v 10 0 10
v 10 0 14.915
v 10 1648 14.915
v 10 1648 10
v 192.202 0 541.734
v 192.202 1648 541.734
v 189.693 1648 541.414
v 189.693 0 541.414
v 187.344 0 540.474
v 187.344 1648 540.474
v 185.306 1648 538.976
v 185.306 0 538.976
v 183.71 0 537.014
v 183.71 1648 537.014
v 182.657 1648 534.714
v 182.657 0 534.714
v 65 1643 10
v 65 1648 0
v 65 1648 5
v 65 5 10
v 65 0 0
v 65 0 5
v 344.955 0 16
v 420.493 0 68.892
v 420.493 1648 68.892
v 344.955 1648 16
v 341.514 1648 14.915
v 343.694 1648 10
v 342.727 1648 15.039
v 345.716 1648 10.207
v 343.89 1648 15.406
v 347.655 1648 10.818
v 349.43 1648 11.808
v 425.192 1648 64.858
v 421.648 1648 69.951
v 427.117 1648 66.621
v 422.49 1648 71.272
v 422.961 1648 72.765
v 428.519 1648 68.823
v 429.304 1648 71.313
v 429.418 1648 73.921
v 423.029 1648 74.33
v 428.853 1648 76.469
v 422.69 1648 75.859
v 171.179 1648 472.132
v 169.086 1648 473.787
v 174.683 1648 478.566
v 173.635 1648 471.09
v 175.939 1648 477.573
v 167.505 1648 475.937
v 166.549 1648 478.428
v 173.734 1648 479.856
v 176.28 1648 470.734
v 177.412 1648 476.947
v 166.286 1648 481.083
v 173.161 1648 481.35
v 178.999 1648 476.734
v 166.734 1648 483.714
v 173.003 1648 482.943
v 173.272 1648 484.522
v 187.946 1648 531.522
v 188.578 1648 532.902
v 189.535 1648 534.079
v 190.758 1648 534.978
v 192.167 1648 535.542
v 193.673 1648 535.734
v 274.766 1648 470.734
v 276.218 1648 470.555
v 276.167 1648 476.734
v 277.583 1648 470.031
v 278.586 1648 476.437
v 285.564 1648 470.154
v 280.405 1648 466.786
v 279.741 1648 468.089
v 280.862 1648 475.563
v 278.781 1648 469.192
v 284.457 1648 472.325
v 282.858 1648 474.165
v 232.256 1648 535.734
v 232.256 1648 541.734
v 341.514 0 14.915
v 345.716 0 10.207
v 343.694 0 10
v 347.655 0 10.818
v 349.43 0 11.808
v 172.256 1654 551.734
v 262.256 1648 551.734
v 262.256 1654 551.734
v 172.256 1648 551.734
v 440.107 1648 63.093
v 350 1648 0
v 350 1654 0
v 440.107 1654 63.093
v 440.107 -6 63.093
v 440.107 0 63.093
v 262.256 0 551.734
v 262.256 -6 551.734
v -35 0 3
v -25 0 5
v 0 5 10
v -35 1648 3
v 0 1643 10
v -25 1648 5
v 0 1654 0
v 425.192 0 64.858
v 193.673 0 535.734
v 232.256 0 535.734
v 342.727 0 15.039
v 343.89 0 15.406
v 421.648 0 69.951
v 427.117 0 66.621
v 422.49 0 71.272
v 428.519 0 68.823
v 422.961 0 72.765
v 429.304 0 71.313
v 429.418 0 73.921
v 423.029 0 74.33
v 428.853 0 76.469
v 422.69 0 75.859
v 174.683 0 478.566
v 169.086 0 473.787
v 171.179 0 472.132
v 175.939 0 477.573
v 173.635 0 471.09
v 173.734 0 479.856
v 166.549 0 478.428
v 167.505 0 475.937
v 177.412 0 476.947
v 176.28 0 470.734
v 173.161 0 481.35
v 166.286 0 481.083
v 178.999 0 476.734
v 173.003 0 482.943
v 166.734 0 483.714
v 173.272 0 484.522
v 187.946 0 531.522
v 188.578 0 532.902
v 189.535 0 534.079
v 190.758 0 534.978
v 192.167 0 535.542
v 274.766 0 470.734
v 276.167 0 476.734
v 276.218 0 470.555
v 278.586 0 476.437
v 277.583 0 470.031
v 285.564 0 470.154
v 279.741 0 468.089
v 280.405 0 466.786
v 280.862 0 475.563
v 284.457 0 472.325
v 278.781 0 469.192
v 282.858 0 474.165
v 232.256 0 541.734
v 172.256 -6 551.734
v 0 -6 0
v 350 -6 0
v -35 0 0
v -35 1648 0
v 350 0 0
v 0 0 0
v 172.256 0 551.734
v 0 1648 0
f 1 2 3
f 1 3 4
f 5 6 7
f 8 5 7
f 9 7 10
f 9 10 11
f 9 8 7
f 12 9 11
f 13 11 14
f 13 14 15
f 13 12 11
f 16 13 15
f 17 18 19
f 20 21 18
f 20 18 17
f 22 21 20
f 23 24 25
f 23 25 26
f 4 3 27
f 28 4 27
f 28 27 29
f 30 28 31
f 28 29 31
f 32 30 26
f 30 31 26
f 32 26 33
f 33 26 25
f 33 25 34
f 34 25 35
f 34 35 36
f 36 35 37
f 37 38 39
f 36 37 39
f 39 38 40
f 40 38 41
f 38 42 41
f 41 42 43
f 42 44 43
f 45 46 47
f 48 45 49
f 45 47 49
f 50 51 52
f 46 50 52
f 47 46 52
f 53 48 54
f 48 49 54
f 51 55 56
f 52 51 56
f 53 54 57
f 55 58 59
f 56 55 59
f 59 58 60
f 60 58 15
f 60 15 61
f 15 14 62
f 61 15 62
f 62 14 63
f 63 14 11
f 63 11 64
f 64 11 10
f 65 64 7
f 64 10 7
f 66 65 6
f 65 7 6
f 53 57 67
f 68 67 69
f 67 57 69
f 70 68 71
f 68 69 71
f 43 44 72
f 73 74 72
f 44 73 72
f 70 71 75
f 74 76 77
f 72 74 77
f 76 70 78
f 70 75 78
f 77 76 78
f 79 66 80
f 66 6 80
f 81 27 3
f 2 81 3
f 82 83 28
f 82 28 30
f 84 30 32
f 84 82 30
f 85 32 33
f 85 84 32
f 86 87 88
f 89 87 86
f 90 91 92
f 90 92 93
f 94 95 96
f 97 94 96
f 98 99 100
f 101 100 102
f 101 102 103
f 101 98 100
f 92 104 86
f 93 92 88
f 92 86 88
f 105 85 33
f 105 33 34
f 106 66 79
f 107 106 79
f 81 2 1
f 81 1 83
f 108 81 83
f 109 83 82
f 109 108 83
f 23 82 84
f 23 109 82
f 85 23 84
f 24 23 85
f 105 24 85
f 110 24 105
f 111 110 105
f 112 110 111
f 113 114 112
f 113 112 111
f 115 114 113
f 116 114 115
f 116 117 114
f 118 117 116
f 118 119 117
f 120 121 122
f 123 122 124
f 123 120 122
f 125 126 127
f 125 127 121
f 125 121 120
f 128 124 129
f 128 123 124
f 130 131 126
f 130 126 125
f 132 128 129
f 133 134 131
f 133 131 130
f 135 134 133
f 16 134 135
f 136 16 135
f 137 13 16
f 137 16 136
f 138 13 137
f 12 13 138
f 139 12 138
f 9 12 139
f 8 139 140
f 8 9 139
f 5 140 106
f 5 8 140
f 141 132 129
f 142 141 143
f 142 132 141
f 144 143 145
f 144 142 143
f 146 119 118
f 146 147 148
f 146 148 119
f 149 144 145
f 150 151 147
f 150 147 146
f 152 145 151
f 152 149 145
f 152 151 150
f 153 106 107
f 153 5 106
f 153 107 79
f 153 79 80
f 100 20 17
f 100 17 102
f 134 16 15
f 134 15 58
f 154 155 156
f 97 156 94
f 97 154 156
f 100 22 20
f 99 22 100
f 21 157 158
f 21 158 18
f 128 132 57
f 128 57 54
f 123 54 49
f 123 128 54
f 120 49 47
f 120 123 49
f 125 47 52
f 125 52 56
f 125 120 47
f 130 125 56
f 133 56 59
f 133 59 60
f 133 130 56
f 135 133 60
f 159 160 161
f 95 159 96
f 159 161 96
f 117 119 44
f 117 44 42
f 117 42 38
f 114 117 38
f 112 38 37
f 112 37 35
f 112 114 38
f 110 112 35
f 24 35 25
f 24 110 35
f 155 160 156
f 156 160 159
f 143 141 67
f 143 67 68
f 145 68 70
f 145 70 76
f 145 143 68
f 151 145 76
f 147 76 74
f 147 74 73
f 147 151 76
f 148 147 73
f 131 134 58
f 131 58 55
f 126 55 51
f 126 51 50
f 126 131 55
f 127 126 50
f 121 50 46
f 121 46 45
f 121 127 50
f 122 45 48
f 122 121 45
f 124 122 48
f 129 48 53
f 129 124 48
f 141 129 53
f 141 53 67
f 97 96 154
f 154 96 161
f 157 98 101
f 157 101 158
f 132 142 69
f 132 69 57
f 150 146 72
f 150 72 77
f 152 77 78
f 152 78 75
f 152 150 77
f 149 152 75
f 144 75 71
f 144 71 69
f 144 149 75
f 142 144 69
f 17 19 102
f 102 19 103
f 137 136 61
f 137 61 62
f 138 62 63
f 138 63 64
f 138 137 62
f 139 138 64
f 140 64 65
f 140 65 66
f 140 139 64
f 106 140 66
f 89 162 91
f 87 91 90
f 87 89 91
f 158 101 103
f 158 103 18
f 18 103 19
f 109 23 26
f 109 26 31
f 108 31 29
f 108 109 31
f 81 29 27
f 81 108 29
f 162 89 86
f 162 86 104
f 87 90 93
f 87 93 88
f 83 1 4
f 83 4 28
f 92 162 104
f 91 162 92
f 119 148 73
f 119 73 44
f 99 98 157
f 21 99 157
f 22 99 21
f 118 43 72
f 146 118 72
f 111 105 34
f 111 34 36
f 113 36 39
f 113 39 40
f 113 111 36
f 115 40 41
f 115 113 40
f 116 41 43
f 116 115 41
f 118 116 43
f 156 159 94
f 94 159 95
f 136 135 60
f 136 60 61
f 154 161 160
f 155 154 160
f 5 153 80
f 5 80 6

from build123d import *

# Parameters (mm, degrees)
F1_DEPTH = 6
F3_DEPTH = 1648
F6_DEPTH = 1648
F7_SIZE2 = 7
F7_SIZE  = 35
F8_SIZE  = 5


with BuildPart() as f1:
    # F0 (on Front) → F1 (new body)
    with BuildSketch(Plane.XZ):
        Polygon((172.2562503424, 551.7335708073), (0, 0), (350, 0), (440.1067248718, 63.0934079986), (262.2562503424, 551.7335708073), align=None)
    extrude(amount=F1_DEPTH)


with BuildPart() as f3:
    # F2 (on Front) → F3 (new body)
    with BuildSketch(Plane.XZ):
        with BuildLine():
            Line((232.2562503424, 541.7335708073), (192.2021726929, 541.7335708073))
            ThreePointArc((192.2021726929, 541.7335708073), (186.277740315, 539.7896927651), (182.6565827394, 534.7137910072))
            Line((182.6565827394, 534.7137910072), (166.7339178296, 483.7137910072))
            ThreePointArc((166.7339178296, 483.7137910072), (168.2233858253, 474.8091384294), (176.2795077831, 470.7335708073))
            Line((176.2795077831, 470.7335708073), (274.766460819, 470.7335708073))
            ThreePointArc((274.766460819, 470.7335708073), (278.2079194371, 469.648483073), (280.4046165437, 466.7856916672))
            Line((280.4046165437, 466.7856916672), (422.6901290366, 75.8594589775))
            ThreePointArc((422.6901290366, 75.8594589775), (422.7742750164, 72.0031033206), (420.49343193, 68.8924258519))
            Line((420.49343193, 68.8924258519), (344.9552193779, 16))
            ThreePointArc((344.9552193779, 16), (343.3179955569, 15.1926105612), (341.5137607598, 14.9149122657))
            Line((341.5137607598, 14.9149122657), (10, 14.9149122657))
            Line((10, 14.9149122657), (10, 10))
            Line((10, 10), (65, 10))
            Line((65, 10), (343.6940242224, 10))
            ThreePointArc((343.6940242224, 10), (346.7010822175, 10.4628304925), (349.4297885859, 11.8084795571))
            Line((349.4297885859, 11.8084795571), (425.1920054898, 64.8577549447))
            ThreePointArc((425.1920054898, 64.8577549447), (428.9934106338, 70.0422173925), (428.8531673342, 76.4694768208))
            Line((428.8531673342, 76.4694768208), (285.5638021033, 470.1537722405))
            ThreePointArc((285.5638021033, 470.1537722405), (281.902640259, 474.9250912502), (276.1668758955, 476.7335708073))
            Line((276.1668758955, 476.7335708073), (178.9991343883, 476.7335708073))
            ThreePointArc((178.9991343883, 476.7335708073), (174.1654612136, 479.1789113805), (173.2717804162, 484.5217029272))
            Line((173.2717804162, 484.5217029272), (187.9456088625, 531.5217029272))
            ThreePointArc((187.9456088625, 531.5217029272), (190.1183034079, 534.567243982), (193.6729628346, 535.7335708073))
            Line((193.6729628346, 535.7335708073), (232.2562503424, 535.7335708073))
            Line((232.2562503424, 535.7335708073), (232.2562503424, 541.7335708073))
        make_face()
    extrude(amount=-F3_DEPTH)


with BuildPart() as f5_1:
    # F5: instance of F1
    add(f1.part.mirror(Plane(origin=(221.411542994, 824, 218.4541908403), x_dir=(1, 0, 0), z_dir=(0, 1, 0))))


with BuildPart() as f6:
    # F2 (on Front) → F6 (new body)
    with BuildSketch(Plane.XZ):
        Polygon((65, 10), (10, 10), (-35, 10), (-35, 0), (65, 0), align=None)
    extrude(amount=-F6_DEPTH)

    # F7
    f7_edges = [f6.edges().sort_by_distance(p)[0] for p in [
        (-35, 824, 10),
    ]]
    f7_side = f6.faces().sort_by_distance((15, 824, 10))[0]
    chamfer(f7_edges, length=F7_SIZE, length2=F7_SIZE2, reference=f7_side)

    # F8
    f8_edges = [f6.edges().sort_by_distance(p)[0] for p in [
        (32.5, 0, 10),
        (32.5, 1648, 10),
    ]]
    chamfer(f8_edges, length=F8_SIZE)


solid = Compound([f1.part, f3.part, f5_1.part, f6.part])
